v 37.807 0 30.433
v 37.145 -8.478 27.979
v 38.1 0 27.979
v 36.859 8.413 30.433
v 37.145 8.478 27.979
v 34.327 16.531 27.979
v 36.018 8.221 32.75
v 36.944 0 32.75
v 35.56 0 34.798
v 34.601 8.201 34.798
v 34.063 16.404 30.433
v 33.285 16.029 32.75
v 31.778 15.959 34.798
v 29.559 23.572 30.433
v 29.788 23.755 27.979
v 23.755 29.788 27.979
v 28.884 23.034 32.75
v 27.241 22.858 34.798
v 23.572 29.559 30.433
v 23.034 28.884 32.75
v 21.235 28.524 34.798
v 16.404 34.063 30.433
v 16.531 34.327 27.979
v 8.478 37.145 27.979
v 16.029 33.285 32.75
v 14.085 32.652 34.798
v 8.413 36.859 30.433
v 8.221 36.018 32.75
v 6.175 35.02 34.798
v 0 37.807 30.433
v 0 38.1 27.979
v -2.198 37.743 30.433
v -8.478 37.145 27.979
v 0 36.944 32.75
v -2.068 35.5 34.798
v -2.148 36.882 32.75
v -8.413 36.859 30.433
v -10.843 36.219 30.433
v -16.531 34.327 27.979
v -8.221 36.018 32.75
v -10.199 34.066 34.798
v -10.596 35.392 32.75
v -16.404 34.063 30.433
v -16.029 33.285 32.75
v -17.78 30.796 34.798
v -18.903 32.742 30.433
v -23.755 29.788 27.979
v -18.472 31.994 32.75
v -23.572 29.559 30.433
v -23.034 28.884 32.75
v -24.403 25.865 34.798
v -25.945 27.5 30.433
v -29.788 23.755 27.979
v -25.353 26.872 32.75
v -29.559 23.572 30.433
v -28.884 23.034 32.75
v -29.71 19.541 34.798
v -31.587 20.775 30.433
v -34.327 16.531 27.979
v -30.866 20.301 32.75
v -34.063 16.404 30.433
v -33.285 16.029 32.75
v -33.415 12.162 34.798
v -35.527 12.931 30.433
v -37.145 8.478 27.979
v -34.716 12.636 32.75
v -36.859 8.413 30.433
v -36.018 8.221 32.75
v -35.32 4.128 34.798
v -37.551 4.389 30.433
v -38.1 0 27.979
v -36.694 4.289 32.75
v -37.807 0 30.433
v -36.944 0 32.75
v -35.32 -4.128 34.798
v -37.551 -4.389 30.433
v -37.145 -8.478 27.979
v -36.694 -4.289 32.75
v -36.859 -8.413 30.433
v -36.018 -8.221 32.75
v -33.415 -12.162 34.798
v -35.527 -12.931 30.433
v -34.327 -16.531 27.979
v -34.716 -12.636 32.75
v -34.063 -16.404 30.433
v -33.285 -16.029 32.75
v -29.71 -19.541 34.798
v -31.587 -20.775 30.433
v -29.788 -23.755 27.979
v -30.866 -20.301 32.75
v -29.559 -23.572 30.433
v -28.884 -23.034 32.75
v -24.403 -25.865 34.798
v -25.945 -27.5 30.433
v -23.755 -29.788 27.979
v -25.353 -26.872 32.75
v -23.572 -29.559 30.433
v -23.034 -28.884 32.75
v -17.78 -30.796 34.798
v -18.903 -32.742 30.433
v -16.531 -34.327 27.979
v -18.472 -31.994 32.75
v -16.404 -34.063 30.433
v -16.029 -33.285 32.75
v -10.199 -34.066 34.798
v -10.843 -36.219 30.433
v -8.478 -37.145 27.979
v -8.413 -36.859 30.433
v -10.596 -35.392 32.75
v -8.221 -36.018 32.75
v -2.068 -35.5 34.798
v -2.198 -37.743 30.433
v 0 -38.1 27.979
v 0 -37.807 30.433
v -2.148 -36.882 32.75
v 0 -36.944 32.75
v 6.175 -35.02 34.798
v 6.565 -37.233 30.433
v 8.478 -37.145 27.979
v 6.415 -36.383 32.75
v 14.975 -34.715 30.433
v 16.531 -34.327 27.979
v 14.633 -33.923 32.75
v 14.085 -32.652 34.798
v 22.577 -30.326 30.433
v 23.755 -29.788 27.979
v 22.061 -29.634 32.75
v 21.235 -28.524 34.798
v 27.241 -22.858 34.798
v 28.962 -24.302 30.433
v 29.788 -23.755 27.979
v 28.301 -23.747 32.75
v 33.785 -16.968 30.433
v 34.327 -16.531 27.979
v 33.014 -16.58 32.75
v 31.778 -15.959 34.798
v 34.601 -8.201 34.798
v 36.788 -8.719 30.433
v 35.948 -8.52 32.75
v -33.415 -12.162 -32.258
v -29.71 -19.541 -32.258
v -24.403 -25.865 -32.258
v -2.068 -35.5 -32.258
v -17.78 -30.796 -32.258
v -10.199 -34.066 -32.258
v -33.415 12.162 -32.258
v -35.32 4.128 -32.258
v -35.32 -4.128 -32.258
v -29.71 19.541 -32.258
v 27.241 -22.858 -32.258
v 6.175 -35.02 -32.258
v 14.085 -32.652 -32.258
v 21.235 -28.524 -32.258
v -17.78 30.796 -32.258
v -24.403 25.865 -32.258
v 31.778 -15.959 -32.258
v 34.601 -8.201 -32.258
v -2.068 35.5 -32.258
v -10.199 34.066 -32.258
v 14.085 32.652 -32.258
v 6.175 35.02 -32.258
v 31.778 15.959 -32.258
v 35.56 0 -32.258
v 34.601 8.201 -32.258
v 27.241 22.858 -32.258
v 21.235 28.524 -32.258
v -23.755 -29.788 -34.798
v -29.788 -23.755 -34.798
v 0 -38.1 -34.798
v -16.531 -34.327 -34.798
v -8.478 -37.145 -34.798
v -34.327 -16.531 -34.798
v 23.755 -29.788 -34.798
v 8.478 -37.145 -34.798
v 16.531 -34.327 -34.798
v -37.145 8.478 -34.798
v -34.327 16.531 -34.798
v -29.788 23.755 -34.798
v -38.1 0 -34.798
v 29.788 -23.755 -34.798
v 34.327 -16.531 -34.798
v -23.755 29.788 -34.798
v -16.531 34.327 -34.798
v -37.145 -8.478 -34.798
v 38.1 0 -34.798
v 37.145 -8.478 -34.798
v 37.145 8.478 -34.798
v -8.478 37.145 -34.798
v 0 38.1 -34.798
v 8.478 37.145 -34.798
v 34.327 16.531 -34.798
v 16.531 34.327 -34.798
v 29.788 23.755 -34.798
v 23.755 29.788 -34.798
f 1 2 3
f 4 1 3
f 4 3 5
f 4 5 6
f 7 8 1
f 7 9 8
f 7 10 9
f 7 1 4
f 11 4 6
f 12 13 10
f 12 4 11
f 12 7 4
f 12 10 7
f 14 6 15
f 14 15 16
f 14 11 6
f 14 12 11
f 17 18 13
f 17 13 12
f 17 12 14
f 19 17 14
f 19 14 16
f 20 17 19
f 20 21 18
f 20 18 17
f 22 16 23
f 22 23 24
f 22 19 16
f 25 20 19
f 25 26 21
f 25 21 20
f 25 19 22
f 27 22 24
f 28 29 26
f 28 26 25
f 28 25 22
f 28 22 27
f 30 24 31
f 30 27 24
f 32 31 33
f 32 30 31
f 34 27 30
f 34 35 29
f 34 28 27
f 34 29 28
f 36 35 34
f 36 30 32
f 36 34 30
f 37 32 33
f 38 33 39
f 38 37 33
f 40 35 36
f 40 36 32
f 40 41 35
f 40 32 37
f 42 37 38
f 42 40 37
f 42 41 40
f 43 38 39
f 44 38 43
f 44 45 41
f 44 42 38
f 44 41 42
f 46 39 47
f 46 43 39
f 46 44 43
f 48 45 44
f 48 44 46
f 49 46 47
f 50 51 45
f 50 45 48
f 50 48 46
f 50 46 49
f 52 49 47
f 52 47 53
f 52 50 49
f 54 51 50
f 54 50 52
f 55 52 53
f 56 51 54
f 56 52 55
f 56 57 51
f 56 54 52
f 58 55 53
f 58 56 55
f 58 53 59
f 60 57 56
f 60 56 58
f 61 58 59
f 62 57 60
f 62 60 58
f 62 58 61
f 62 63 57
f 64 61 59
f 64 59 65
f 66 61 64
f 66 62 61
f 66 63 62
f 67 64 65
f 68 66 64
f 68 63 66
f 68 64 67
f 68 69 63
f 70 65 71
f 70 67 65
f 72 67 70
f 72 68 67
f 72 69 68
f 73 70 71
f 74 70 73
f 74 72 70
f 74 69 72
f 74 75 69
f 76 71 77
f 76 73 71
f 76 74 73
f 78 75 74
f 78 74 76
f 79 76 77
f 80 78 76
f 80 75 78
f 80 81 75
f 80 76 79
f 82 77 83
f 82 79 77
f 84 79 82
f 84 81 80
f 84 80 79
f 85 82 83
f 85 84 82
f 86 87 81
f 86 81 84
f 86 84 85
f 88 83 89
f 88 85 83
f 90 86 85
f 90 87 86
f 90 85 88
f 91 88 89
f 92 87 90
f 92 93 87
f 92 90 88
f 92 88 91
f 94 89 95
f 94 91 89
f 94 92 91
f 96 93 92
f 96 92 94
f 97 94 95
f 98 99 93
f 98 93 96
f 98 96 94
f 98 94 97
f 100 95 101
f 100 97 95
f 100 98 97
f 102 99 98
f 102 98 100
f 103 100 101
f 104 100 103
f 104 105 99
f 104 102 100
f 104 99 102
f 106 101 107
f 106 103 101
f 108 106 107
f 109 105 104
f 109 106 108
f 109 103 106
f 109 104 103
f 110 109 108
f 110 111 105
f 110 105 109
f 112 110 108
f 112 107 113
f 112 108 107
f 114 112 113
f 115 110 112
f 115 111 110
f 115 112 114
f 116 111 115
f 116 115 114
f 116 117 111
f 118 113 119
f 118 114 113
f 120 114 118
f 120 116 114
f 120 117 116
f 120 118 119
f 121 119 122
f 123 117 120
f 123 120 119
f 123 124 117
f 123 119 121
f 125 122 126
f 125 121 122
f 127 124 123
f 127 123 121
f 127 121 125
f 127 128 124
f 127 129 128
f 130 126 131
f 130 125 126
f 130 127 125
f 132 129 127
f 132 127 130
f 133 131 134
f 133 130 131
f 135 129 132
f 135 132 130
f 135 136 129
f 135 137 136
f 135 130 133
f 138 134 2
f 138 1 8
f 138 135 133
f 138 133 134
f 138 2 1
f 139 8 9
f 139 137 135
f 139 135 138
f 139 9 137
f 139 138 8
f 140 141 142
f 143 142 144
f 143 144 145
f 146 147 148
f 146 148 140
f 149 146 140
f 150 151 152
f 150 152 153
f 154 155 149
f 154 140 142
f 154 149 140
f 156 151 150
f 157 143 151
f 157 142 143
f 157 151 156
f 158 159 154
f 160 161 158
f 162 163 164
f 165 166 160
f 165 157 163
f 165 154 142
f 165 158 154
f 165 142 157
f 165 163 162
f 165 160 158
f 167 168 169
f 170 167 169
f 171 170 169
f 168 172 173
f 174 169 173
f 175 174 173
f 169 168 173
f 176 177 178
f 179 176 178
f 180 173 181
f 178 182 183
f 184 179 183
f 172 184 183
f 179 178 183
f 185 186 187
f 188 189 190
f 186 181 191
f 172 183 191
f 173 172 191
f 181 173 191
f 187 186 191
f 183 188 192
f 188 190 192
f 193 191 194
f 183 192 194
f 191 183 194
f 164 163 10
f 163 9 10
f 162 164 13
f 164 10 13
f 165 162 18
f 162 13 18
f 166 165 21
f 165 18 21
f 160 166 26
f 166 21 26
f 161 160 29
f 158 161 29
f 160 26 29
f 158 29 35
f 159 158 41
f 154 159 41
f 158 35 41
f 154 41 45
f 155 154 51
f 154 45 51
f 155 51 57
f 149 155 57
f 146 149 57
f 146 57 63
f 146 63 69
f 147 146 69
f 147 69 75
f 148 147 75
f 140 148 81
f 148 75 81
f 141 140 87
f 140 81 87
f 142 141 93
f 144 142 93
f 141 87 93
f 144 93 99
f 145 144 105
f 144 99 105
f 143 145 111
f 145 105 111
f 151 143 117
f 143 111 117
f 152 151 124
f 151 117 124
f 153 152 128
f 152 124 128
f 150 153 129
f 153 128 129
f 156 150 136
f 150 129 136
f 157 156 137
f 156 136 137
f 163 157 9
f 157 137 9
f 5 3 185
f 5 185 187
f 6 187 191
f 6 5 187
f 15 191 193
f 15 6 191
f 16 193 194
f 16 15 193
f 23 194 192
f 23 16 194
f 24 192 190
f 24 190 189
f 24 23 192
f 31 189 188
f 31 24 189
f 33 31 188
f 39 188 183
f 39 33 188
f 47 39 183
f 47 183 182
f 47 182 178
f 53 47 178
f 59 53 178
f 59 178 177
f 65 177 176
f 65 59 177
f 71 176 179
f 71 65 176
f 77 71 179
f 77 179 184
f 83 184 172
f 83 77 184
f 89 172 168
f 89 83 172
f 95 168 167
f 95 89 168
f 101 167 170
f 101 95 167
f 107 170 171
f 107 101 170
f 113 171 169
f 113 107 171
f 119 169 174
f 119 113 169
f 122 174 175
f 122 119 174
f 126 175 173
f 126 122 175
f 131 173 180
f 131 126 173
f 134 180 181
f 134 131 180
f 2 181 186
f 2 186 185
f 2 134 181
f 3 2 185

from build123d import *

# Parameters (mm, degrees)
F0_R     = 38.1
F1_DEPTH = 34.798
F2_T     = -2.54


# Not quite as in the source:
# - a fillet or chamfer that OpenCascade refuses, or shapes differently, is made with other operations: its cross-section is extruded or revolved along the edge and cut away or added
# - the program builds the solid bodies; features that only make, move or delete a surface that nothing else refers to are left out


with BuildPart() as f1:
    # F0 (on Top) → F1 (new body, symmetric)
    with BuildSketch(Plane.XY):
        Circle(F0_R)
    extrude(amount=F1_DEPTH, both=True)

    # F2
    f2_openings = [f1.faces().sort_by_distance(p)[0] for p in [
        (0, 0, 34.798),
    ]]
    offset(amount=F2_T, openings=f2_openings)

    # F3: fillet of radius 10.4245741623 on 1 edges, made by hand

    # F3_s1 → F3_t2 (revolve, cut)
    with BuildSketch(Plane.XZ):
        with BuildLine():
            ThreePointArc((38.1, 27.9785251856), (37.4443836777, 31.617097596), (35.56, 34.798))
            Line((35.56, 34.798), (38.1, 34.798))
            Line((38.1, 34.798), (38.1, 27.9785251856))
        make_face()
    revolve(axis=Axis((0, 0, 34.798), (0, 0, 1)), mode=Mode.SUBTRACT)


solid = f1.part
